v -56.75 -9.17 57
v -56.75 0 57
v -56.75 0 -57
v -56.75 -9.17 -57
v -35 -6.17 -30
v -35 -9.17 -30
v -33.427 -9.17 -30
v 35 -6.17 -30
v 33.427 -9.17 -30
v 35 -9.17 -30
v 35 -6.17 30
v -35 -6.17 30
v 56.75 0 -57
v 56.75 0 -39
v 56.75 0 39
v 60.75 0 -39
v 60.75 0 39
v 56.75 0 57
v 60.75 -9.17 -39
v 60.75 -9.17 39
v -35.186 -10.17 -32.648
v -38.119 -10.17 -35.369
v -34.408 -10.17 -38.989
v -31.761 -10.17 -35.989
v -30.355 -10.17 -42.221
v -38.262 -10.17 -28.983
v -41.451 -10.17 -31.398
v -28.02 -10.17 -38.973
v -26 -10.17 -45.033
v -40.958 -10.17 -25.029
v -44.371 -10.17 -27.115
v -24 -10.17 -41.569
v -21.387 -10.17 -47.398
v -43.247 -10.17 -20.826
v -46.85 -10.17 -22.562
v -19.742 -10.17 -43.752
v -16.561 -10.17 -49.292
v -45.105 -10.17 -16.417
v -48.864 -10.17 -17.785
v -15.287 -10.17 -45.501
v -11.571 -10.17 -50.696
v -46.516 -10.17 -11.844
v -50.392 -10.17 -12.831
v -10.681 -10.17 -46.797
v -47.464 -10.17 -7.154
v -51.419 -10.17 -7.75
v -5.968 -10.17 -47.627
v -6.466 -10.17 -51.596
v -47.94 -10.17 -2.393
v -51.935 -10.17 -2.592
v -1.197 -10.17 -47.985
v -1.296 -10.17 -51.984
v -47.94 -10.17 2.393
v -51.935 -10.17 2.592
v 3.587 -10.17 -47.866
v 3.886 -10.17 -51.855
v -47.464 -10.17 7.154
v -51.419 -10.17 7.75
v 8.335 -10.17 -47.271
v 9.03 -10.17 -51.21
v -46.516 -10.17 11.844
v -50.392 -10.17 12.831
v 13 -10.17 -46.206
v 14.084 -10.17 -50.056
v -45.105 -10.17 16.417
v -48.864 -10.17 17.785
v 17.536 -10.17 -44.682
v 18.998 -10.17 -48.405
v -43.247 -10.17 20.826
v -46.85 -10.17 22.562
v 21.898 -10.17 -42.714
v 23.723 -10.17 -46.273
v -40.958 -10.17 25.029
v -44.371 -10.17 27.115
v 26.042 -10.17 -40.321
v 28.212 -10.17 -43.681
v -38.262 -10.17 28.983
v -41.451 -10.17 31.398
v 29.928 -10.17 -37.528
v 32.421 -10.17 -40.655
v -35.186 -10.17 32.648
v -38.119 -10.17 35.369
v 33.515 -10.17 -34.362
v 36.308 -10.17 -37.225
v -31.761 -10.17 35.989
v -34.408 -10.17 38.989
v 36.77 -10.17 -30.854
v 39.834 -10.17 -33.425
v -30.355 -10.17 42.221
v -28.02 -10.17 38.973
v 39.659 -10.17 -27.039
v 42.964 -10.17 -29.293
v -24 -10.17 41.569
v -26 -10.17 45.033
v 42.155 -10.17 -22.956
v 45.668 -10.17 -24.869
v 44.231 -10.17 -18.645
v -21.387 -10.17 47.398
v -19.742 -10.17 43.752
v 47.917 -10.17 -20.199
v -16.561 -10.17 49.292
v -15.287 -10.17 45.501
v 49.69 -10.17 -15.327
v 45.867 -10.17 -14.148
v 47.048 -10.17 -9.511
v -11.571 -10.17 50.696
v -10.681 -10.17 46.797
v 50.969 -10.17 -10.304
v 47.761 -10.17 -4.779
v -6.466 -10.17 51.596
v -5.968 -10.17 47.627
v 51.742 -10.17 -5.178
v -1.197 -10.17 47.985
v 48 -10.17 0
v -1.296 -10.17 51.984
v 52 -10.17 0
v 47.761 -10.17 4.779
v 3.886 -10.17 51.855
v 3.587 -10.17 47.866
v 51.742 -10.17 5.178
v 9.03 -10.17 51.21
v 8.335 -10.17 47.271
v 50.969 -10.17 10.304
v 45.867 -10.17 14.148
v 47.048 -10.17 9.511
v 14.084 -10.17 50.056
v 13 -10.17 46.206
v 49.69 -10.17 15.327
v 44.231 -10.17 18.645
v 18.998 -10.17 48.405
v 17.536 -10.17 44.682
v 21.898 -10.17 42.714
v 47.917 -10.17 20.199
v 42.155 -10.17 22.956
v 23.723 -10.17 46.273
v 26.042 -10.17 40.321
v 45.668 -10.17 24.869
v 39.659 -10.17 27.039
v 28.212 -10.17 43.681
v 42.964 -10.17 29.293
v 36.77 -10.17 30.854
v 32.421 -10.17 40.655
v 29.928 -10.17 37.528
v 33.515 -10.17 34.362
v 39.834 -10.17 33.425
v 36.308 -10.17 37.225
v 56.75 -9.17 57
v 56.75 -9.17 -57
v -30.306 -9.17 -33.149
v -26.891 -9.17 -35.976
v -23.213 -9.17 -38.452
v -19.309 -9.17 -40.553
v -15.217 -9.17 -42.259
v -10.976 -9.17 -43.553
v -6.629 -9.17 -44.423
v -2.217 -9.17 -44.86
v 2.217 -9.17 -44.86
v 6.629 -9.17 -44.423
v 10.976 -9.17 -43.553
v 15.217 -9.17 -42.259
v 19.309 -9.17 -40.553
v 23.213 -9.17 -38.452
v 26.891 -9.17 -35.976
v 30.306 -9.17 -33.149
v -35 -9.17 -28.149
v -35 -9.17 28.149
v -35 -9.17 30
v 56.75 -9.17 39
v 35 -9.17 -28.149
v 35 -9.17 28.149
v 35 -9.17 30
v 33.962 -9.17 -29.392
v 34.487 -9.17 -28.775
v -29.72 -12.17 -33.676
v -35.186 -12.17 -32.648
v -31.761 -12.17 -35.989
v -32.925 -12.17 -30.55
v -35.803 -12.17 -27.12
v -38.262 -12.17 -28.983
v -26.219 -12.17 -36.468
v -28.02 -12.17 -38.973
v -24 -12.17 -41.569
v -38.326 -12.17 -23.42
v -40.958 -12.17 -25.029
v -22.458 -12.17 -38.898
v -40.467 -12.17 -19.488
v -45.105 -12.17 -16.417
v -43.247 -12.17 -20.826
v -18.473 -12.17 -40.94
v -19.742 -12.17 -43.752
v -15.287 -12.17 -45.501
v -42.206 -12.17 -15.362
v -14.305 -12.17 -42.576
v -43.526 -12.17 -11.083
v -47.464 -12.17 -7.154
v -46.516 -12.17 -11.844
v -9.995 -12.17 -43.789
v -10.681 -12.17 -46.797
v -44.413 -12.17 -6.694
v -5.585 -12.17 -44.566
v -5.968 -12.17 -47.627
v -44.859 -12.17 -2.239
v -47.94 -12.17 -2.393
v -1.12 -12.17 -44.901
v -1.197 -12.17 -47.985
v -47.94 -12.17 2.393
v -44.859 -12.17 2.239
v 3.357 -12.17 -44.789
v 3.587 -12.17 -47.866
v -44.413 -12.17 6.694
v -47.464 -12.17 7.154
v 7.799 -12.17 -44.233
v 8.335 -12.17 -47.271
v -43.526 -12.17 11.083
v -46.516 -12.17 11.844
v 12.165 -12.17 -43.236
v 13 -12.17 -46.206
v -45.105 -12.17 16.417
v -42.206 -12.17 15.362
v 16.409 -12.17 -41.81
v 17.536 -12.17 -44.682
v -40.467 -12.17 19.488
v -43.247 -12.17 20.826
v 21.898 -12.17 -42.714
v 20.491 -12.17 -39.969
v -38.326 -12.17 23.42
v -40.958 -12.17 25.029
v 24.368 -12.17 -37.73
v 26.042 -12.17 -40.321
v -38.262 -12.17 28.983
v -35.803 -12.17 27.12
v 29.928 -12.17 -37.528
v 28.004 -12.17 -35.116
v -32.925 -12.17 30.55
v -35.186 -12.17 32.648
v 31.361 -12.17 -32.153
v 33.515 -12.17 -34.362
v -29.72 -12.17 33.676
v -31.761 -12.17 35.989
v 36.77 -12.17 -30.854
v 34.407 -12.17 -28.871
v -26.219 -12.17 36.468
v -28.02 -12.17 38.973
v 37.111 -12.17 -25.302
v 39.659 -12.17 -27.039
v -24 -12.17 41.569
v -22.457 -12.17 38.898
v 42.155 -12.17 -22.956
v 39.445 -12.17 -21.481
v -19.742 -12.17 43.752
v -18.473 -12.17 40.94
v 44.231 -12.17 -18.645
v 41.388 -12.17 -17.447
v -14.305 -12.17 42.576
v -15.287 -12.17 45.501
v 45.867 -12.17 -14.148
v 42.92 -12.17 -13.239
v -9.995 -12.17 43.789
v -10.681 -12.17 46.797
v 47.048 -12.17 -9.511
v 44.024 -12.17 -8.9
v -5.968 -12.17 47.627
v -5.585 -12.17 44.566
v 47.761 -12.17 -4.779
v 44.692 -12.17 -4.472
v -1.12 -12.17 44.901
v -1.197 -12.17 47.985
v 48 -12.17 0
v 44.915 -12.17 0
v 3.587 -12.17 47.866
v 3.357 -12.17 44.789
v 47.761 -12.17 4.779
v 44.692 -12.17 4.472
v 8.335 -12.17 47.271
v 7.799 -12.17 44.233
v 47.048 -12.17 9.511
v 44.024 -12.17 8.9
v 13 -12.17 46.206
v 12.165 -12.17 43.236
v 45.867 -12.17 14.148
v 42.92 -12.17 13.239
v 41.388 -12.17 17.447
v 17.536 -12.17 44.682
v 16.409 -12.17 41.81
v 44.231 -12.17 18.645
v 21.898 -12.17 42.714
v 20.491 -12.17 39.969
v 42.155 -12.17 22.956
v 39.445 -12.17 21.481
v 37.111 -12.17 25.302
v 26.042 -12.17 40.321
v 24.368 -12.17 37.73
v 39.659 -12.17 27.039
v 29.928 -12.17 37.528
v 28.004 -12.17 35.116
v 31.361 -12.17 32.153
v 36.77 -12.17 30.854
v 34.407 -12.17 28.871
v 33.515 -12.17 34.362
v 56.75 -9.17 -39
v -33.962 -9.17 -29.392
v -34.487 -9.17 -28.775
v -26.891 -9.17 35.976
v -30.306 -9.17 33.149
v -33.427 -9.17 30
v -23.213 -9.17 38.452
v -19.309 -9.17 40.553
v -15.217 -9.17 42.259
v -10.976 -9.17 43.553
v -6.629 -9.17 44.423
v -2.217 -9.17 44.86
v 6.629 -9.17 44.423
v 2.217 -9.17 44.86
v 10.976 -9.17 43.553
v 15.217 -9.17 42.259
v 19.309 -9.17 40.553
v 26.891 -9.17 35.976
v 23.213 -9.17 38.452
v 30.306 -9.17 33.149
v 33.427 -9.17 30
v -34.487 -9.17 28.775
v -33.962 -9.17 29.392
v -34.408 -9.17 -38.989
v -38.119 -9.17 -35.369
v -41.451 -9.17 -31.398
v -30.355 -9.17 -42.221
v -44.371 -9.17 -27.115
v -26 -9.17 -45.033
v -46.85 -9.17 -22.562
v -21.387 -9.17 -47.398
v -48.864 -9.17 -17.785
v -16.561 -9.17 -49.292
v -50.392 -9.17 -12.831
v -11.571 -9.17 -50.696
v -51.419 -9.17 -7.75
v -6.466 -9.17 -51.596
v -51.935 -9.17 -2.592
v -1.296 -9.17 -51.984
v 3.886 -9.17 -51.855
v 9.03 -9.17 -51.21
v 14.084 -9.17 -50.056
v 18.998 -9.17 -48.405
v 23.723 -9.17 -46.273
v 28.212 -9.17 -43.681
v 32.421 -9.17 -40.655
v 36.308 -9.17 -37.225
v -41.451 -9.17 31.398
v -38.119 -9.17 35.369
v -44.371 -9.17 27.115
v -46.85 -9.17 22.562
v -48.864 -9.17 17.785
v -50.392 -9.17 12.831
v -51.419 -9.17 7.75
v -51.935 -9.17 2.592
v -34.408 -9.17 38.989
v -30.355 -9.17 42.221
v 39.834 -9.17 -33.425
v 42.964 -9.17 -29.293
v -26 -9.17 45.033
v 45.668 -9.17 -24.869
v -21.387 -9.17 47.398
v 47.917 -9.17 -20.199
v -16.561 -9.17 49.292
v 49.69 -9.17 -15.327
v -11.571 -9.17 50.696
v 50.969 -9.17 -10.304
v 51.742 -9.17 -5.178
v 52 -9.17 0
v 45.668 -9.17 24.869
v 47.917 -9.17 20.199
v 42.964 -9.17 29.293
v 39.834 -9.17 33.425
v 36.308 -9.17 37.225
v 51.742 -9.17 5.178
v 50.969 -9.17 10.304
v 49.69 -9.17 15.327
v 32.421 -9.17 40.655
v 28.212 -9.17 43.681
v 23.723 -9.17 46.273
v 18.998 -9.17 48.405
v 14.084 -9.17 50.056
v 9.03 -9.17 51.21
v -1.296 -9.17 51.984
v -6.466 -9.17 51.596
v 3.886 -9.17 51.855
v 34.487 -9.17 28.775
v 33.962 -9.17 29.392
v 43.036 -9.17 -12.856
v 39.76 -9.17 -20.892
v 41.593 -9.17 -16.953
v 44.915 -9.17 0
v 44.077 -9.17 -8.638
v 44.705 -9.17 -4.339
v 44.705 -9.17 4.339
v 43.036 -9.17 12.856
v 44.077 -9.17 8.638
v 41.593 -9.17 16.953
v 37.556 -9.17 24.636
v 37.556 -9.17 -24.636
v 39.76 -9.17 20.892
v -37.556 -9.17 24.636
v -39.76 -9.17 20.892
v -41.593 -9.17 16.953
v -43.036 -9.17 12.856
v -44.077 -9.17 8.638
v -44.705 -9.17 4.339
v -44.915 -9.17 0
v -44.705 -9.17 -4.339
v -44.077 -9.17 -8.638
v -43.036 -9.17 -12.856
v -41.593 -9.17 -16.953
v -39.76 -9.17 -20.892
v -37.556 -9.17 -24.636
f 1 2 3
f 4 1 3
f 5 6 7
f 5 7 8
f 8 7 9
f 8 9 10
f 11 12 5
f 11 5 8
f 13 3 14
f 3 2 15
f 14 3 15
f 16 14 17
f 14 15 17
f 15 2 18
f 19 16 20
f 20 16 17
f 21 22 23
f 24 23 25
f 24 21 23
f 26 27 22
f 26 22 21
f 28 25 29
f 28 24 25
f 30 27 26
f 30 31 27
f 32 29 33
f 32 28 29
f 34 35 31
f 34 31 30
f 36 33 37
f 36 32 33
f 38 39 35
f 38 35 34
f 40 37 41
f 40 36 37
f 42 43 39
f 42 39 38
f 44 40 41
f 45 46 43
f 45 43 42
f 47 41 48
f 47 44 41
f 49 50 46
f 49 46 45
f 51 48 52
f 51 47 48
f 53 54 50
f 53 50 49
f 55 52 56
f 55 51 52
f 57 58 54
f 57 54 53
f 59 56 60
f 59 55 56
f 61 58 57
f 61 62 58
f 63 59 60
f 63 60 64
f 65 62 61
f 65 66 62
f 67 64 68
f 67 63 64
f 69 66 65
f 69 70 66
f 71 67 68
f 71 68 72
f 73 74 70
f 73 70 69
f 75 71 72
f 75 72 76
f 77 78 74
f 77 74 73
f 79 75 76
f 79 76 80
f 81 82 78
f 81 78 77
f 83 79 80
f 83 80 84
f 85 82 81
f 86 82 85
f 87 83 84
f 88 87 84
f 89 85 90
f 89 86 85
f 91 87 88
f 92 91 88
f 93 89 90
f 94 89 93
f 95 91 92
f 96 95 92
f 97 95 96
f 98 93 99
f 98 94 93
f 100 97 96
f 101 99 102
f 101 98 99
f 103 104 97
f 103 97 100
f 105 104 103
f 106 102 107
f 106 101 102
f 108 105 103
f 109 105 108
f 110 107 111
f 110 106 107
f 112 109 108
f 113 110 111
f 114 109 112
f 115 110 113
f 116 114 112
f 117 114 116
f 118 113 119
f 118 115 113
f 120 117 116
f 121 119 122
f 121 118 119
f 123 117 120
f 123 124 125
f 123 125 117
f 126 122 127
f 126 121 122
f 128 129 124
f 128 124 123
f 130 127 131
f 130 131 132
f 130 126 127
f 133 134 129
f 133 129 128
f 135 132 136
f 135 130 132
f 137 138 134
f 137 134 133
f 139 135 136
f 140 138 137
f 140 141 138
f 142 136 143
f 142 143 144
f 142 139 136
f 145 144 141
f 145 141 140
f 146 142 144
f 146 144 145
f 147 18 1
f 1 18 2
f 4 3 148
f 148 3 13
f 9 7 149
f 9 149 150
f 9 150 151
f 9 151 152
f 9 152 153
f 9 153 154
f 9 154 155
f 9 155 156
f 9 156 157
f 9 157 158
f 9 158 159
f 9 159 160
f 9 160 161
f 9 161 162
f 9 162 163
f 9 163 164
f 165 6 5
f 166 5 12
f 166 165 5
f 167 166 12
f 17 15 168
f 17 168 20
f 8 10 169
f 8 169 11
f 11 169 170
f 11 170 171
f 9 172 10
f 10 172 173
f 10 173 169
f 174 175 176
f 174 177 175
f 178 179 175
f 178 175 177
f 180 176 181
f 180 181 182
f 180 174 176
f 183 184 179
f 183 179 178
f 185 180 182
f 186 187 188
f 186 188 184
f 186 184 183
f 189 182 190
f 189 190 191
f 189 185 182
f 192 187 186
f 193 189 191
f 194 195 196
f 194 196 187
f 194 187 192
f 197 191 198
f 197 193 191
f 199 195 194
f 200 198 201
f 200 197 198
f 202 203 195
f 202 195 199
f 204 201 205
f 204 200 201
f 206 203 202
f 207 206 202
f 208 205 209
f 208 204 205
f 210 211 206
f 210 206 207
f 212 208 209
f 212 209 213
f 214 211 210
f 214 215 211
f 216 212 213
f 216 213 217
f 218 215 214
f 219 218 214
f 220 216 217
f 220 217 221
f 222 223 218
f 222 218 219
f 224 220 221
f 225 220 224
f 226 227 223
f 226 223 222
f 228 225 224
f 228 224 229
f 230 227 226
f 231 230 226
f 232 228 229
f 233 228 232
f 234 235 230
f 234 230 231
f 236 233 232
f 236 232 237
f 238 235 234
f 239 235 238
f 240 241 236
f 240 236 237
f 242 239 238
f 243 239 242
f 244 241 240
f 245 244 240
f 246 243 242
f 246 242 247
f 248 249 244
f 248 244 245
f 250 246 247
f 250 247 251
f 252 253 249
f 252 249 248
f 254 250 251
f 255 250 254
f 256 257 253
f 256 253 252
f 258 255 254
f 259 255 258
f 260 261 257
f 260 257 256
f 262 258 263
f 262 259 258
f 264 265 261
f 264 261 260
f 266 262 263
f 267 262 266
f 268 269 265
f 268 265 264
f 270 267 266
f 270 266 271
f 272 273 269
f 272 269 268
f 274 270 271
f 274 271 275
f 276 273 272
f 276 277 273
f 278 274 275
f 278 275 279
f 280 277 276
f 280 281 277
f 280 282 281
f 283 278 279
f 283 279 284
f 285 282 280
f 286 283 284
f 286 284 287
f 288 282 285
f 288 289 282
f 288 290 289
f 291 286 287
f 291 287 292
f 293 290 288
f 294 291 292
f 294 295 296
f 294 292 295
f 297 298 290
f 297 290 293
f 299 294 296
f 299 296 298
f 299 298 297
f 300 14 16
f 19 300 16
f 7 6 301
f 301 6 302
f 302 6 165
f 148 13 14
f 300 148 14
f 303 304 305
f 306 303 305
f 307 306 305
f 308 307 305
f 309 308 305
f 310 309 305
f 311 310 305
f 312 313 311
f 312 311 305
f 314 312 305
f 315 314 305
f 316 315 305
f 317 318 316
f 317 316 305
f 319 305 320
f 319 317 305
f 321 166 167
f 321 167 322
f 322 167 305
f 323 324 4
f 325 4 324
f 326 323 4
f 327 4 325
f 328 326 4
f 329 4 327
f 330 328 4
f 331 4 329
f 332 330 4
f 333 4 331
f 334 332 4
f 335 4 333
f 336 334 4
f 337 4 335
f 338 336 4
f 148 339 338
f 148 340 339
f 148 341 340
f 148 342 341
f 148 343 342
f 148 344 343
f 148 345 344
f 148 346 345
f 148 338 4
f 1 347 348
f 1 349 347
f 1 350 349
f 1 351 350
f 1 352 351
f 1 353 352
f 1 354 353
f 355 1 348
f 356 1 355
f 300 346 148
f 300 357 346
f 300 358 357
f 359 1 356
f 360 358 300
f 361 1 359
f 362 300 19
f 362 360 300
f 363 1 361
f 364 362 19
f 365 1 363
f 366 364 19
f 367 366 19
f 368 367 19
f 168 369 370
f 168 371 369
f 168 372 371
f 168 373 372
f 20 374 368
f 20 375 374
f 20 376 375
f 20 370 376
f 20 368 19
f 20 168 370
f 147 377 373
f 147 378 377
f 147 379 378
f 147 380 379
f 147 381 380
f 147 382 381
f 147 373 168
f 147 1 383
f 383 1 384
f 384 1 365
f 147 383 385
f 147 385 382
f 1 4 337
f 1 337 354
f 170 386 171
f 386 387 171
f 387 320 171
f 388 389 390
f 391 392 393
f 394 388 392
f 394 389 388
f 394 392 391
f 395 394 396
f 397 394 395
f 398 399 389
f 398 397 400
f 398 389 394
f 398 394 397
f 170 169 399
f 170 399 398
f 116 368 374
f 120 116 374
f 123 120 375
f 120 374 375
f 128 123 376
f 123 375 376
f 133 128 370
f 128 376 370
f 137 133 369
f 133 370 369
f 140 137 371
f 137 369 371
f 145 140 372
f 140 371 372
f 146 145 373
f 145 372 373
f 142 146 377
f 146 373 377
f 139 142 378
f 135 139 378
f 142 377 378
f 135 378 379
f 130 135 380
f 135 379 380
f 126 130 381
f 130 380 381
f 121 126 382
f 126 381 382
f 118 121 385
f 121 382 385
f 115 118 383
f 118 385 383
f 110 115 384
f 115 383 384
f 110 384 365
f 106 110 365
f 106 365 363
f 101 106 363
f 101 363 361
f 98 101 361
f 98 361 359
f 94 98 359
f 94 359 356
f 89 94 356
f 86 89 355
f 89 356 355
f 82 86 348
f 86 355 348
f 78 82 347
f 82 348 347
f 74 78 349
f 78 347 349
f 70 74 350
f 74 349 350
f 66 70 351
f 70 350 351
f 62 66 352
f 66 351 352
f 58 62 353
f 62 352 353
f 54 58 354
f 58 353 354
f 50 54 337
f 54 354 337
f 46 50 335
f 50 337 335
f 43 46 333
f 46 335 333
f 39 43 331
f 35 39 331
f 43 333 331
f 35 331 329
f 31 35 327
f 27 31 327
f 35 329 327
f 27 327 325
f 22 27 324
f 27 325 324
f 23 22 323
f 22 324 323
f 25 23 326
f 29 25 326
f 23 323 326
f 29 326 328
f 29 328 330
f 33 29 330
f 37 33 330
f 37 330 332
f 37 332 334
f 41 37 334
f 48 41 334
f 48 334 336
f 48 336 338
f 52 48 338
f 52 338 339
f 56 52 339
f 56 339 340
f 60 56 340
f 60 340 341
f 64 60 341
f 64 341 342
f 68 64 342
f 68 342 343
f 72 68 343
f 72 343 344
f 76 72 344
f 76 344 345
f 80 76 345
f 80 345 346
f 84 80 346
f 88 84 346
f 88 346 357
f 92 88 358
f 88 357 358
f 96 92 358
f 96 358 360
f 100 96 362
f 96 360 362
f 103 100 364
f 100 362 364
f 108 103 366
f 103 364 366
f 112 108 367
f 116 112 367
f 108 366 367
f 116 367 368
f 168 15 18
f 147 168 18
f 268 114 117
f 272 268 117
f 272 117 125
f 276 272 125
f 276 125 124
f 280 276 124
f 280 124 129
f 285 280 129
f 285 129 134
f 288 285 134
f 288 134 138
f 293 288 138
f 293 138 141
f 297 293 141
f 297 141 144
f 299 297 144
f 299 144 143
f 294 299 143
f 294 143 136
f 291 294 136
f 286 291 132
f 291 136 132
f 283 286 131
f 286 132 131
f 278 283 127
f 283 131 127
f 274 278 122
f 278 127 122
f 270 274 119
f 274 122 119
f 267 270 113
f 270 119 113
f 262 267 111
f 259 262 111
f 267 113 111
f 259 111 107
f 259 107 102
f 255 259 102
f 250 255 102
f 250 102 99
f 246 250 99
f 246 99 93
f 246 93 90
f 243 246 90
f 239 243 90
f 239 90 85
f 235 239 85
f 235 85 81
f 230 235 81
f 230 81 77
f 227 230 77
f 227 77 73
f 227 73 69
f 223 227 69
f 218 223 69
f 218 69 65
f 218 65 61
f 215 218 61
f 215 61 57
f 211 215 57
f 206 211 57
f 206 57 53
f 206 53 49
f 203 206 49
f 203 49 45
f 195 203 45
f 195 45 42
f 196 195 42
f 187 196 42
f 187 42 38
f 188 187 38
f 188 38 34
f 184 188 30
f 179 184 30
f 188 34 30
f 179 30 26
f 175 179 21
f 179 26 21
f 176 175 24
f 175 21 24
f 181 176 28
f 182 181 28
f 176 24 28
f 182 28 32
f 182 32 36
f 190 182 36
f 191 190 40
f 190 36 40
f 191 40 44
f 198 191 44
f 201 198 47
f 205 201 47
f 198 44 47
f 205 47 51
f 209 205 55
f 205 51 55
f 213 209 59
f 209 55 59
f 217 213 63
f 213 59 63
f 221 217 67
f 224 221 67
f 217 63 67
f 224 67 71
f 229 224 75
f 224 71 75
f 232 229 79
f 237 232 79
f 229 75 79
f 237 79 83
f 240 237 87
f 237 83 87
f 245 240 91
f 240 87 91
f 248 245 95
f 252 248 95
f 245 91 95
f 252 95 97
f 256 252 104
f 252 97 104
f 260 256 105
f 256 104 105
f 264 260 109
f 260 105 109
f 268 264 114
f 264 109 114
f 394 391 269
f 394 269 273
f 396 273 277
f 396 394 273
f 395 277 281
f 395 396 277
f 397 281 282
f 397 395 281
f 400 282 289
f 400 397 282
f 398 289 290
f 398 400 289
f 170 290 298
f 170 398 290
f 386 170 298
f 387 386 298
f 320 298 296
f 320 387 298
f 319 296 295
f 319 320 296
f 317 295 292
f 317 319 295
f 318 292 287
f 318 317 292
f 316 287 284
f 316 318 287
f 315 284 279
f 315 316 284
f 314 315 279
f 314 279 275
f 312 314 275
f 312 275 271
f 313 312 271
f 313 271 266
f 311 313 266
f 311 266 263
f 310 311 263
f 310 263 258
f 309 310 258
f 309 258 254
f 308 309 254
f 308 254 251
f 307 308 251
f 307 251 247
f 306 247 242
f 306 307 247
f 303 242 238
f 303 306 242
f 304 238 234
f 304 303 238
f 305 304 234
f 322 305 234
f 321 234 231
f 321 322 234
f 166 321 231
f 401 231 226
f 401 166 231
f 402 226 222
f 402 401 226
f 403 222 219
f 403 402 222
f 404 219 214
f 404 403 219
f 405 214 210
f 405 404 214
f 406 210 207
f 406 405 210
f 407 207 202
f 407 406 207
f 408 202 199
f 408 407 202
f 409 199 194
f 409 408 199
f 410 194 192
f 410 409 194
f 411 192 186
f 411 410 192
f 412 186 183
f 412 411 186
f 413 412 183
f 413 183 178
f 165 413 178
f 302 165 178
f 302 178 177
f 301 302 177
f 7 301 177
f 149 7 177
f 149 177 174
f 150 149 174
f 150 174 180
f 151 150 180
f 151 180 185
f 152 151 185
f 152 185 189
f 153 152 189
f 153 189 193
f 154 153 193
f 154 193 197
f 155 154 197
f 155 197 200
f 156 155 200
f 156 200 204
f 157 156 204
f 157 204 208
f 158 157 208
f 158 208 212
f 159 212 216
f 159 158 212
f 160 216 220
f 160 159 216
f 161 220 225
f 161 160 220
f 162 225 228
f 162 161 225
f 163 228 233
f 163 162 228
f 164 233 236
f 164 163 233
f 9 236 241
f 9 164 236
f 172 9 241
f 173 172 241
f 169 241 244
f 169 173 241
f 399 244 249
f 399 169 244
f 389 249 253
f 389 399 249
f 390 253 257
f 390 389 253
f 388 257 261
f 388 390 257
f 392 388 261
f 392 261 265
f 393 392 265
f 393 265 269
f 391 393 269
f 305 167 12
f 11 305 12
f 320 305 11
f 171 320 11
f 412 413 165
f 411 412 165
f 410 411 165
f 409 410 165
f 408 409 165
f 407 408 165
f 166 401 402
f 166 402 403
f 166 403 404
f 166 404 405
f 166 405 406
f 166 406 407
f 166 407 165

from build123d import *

# Parameters (mm, degrees)
F0_W     = 4
F0_H     = 78
F1_DEPTH = 9.17
F2_R     = 48
F2_R_2   = 44.915
F3_DEPTH = 3
F4_R     = 52
F4_R_2   = 45.823457
F5_DEPTH = 1
F6_W     = 70
F6_H     = 60
F7_DEPTH = 3


with BuildPart() as f1:
    # F0 (on Front) → F1 (new body)
    with BuildSketch(Plane.XZ):
        Polygon((56.75, 39), (56.75, 57), (-56.75, 57), (-56.75, -57), (56.75, -57), (56.75, -39), align=None)
        with Locations((58.75, 0)):
            Rectangle(F0_W, F0_H)
    extrude(amount=F1_DEPTH)

    # F2 (on face) → F3 (join)
    with BuildSketch(Plane.XZ.offset(9.17)):
        Circle(F2_R)
        Circle(F2_R_2, mode=Mode.SUBTRACT)
    extrude(amount=F3_DEPTH)

    # F4 (on face) → F5 (join)
    with BuildSketch(Plane.XZ.offset(9.17)):
        Circle(F4_R)
        Circle(F4_R_2, mode=Mode.SUBTRACT)
    extrude(amount=F5_DEPTH)

    # F6 (on face) → F7 (cut)
    with BuildSketch(Plane.XZ.offset(9.17)):
        Rectangle(F6_W, F6_H)
    extrude(amount=-F7_DEPTH, mode=Mode.SUBTRACT)


solid = f1.part
